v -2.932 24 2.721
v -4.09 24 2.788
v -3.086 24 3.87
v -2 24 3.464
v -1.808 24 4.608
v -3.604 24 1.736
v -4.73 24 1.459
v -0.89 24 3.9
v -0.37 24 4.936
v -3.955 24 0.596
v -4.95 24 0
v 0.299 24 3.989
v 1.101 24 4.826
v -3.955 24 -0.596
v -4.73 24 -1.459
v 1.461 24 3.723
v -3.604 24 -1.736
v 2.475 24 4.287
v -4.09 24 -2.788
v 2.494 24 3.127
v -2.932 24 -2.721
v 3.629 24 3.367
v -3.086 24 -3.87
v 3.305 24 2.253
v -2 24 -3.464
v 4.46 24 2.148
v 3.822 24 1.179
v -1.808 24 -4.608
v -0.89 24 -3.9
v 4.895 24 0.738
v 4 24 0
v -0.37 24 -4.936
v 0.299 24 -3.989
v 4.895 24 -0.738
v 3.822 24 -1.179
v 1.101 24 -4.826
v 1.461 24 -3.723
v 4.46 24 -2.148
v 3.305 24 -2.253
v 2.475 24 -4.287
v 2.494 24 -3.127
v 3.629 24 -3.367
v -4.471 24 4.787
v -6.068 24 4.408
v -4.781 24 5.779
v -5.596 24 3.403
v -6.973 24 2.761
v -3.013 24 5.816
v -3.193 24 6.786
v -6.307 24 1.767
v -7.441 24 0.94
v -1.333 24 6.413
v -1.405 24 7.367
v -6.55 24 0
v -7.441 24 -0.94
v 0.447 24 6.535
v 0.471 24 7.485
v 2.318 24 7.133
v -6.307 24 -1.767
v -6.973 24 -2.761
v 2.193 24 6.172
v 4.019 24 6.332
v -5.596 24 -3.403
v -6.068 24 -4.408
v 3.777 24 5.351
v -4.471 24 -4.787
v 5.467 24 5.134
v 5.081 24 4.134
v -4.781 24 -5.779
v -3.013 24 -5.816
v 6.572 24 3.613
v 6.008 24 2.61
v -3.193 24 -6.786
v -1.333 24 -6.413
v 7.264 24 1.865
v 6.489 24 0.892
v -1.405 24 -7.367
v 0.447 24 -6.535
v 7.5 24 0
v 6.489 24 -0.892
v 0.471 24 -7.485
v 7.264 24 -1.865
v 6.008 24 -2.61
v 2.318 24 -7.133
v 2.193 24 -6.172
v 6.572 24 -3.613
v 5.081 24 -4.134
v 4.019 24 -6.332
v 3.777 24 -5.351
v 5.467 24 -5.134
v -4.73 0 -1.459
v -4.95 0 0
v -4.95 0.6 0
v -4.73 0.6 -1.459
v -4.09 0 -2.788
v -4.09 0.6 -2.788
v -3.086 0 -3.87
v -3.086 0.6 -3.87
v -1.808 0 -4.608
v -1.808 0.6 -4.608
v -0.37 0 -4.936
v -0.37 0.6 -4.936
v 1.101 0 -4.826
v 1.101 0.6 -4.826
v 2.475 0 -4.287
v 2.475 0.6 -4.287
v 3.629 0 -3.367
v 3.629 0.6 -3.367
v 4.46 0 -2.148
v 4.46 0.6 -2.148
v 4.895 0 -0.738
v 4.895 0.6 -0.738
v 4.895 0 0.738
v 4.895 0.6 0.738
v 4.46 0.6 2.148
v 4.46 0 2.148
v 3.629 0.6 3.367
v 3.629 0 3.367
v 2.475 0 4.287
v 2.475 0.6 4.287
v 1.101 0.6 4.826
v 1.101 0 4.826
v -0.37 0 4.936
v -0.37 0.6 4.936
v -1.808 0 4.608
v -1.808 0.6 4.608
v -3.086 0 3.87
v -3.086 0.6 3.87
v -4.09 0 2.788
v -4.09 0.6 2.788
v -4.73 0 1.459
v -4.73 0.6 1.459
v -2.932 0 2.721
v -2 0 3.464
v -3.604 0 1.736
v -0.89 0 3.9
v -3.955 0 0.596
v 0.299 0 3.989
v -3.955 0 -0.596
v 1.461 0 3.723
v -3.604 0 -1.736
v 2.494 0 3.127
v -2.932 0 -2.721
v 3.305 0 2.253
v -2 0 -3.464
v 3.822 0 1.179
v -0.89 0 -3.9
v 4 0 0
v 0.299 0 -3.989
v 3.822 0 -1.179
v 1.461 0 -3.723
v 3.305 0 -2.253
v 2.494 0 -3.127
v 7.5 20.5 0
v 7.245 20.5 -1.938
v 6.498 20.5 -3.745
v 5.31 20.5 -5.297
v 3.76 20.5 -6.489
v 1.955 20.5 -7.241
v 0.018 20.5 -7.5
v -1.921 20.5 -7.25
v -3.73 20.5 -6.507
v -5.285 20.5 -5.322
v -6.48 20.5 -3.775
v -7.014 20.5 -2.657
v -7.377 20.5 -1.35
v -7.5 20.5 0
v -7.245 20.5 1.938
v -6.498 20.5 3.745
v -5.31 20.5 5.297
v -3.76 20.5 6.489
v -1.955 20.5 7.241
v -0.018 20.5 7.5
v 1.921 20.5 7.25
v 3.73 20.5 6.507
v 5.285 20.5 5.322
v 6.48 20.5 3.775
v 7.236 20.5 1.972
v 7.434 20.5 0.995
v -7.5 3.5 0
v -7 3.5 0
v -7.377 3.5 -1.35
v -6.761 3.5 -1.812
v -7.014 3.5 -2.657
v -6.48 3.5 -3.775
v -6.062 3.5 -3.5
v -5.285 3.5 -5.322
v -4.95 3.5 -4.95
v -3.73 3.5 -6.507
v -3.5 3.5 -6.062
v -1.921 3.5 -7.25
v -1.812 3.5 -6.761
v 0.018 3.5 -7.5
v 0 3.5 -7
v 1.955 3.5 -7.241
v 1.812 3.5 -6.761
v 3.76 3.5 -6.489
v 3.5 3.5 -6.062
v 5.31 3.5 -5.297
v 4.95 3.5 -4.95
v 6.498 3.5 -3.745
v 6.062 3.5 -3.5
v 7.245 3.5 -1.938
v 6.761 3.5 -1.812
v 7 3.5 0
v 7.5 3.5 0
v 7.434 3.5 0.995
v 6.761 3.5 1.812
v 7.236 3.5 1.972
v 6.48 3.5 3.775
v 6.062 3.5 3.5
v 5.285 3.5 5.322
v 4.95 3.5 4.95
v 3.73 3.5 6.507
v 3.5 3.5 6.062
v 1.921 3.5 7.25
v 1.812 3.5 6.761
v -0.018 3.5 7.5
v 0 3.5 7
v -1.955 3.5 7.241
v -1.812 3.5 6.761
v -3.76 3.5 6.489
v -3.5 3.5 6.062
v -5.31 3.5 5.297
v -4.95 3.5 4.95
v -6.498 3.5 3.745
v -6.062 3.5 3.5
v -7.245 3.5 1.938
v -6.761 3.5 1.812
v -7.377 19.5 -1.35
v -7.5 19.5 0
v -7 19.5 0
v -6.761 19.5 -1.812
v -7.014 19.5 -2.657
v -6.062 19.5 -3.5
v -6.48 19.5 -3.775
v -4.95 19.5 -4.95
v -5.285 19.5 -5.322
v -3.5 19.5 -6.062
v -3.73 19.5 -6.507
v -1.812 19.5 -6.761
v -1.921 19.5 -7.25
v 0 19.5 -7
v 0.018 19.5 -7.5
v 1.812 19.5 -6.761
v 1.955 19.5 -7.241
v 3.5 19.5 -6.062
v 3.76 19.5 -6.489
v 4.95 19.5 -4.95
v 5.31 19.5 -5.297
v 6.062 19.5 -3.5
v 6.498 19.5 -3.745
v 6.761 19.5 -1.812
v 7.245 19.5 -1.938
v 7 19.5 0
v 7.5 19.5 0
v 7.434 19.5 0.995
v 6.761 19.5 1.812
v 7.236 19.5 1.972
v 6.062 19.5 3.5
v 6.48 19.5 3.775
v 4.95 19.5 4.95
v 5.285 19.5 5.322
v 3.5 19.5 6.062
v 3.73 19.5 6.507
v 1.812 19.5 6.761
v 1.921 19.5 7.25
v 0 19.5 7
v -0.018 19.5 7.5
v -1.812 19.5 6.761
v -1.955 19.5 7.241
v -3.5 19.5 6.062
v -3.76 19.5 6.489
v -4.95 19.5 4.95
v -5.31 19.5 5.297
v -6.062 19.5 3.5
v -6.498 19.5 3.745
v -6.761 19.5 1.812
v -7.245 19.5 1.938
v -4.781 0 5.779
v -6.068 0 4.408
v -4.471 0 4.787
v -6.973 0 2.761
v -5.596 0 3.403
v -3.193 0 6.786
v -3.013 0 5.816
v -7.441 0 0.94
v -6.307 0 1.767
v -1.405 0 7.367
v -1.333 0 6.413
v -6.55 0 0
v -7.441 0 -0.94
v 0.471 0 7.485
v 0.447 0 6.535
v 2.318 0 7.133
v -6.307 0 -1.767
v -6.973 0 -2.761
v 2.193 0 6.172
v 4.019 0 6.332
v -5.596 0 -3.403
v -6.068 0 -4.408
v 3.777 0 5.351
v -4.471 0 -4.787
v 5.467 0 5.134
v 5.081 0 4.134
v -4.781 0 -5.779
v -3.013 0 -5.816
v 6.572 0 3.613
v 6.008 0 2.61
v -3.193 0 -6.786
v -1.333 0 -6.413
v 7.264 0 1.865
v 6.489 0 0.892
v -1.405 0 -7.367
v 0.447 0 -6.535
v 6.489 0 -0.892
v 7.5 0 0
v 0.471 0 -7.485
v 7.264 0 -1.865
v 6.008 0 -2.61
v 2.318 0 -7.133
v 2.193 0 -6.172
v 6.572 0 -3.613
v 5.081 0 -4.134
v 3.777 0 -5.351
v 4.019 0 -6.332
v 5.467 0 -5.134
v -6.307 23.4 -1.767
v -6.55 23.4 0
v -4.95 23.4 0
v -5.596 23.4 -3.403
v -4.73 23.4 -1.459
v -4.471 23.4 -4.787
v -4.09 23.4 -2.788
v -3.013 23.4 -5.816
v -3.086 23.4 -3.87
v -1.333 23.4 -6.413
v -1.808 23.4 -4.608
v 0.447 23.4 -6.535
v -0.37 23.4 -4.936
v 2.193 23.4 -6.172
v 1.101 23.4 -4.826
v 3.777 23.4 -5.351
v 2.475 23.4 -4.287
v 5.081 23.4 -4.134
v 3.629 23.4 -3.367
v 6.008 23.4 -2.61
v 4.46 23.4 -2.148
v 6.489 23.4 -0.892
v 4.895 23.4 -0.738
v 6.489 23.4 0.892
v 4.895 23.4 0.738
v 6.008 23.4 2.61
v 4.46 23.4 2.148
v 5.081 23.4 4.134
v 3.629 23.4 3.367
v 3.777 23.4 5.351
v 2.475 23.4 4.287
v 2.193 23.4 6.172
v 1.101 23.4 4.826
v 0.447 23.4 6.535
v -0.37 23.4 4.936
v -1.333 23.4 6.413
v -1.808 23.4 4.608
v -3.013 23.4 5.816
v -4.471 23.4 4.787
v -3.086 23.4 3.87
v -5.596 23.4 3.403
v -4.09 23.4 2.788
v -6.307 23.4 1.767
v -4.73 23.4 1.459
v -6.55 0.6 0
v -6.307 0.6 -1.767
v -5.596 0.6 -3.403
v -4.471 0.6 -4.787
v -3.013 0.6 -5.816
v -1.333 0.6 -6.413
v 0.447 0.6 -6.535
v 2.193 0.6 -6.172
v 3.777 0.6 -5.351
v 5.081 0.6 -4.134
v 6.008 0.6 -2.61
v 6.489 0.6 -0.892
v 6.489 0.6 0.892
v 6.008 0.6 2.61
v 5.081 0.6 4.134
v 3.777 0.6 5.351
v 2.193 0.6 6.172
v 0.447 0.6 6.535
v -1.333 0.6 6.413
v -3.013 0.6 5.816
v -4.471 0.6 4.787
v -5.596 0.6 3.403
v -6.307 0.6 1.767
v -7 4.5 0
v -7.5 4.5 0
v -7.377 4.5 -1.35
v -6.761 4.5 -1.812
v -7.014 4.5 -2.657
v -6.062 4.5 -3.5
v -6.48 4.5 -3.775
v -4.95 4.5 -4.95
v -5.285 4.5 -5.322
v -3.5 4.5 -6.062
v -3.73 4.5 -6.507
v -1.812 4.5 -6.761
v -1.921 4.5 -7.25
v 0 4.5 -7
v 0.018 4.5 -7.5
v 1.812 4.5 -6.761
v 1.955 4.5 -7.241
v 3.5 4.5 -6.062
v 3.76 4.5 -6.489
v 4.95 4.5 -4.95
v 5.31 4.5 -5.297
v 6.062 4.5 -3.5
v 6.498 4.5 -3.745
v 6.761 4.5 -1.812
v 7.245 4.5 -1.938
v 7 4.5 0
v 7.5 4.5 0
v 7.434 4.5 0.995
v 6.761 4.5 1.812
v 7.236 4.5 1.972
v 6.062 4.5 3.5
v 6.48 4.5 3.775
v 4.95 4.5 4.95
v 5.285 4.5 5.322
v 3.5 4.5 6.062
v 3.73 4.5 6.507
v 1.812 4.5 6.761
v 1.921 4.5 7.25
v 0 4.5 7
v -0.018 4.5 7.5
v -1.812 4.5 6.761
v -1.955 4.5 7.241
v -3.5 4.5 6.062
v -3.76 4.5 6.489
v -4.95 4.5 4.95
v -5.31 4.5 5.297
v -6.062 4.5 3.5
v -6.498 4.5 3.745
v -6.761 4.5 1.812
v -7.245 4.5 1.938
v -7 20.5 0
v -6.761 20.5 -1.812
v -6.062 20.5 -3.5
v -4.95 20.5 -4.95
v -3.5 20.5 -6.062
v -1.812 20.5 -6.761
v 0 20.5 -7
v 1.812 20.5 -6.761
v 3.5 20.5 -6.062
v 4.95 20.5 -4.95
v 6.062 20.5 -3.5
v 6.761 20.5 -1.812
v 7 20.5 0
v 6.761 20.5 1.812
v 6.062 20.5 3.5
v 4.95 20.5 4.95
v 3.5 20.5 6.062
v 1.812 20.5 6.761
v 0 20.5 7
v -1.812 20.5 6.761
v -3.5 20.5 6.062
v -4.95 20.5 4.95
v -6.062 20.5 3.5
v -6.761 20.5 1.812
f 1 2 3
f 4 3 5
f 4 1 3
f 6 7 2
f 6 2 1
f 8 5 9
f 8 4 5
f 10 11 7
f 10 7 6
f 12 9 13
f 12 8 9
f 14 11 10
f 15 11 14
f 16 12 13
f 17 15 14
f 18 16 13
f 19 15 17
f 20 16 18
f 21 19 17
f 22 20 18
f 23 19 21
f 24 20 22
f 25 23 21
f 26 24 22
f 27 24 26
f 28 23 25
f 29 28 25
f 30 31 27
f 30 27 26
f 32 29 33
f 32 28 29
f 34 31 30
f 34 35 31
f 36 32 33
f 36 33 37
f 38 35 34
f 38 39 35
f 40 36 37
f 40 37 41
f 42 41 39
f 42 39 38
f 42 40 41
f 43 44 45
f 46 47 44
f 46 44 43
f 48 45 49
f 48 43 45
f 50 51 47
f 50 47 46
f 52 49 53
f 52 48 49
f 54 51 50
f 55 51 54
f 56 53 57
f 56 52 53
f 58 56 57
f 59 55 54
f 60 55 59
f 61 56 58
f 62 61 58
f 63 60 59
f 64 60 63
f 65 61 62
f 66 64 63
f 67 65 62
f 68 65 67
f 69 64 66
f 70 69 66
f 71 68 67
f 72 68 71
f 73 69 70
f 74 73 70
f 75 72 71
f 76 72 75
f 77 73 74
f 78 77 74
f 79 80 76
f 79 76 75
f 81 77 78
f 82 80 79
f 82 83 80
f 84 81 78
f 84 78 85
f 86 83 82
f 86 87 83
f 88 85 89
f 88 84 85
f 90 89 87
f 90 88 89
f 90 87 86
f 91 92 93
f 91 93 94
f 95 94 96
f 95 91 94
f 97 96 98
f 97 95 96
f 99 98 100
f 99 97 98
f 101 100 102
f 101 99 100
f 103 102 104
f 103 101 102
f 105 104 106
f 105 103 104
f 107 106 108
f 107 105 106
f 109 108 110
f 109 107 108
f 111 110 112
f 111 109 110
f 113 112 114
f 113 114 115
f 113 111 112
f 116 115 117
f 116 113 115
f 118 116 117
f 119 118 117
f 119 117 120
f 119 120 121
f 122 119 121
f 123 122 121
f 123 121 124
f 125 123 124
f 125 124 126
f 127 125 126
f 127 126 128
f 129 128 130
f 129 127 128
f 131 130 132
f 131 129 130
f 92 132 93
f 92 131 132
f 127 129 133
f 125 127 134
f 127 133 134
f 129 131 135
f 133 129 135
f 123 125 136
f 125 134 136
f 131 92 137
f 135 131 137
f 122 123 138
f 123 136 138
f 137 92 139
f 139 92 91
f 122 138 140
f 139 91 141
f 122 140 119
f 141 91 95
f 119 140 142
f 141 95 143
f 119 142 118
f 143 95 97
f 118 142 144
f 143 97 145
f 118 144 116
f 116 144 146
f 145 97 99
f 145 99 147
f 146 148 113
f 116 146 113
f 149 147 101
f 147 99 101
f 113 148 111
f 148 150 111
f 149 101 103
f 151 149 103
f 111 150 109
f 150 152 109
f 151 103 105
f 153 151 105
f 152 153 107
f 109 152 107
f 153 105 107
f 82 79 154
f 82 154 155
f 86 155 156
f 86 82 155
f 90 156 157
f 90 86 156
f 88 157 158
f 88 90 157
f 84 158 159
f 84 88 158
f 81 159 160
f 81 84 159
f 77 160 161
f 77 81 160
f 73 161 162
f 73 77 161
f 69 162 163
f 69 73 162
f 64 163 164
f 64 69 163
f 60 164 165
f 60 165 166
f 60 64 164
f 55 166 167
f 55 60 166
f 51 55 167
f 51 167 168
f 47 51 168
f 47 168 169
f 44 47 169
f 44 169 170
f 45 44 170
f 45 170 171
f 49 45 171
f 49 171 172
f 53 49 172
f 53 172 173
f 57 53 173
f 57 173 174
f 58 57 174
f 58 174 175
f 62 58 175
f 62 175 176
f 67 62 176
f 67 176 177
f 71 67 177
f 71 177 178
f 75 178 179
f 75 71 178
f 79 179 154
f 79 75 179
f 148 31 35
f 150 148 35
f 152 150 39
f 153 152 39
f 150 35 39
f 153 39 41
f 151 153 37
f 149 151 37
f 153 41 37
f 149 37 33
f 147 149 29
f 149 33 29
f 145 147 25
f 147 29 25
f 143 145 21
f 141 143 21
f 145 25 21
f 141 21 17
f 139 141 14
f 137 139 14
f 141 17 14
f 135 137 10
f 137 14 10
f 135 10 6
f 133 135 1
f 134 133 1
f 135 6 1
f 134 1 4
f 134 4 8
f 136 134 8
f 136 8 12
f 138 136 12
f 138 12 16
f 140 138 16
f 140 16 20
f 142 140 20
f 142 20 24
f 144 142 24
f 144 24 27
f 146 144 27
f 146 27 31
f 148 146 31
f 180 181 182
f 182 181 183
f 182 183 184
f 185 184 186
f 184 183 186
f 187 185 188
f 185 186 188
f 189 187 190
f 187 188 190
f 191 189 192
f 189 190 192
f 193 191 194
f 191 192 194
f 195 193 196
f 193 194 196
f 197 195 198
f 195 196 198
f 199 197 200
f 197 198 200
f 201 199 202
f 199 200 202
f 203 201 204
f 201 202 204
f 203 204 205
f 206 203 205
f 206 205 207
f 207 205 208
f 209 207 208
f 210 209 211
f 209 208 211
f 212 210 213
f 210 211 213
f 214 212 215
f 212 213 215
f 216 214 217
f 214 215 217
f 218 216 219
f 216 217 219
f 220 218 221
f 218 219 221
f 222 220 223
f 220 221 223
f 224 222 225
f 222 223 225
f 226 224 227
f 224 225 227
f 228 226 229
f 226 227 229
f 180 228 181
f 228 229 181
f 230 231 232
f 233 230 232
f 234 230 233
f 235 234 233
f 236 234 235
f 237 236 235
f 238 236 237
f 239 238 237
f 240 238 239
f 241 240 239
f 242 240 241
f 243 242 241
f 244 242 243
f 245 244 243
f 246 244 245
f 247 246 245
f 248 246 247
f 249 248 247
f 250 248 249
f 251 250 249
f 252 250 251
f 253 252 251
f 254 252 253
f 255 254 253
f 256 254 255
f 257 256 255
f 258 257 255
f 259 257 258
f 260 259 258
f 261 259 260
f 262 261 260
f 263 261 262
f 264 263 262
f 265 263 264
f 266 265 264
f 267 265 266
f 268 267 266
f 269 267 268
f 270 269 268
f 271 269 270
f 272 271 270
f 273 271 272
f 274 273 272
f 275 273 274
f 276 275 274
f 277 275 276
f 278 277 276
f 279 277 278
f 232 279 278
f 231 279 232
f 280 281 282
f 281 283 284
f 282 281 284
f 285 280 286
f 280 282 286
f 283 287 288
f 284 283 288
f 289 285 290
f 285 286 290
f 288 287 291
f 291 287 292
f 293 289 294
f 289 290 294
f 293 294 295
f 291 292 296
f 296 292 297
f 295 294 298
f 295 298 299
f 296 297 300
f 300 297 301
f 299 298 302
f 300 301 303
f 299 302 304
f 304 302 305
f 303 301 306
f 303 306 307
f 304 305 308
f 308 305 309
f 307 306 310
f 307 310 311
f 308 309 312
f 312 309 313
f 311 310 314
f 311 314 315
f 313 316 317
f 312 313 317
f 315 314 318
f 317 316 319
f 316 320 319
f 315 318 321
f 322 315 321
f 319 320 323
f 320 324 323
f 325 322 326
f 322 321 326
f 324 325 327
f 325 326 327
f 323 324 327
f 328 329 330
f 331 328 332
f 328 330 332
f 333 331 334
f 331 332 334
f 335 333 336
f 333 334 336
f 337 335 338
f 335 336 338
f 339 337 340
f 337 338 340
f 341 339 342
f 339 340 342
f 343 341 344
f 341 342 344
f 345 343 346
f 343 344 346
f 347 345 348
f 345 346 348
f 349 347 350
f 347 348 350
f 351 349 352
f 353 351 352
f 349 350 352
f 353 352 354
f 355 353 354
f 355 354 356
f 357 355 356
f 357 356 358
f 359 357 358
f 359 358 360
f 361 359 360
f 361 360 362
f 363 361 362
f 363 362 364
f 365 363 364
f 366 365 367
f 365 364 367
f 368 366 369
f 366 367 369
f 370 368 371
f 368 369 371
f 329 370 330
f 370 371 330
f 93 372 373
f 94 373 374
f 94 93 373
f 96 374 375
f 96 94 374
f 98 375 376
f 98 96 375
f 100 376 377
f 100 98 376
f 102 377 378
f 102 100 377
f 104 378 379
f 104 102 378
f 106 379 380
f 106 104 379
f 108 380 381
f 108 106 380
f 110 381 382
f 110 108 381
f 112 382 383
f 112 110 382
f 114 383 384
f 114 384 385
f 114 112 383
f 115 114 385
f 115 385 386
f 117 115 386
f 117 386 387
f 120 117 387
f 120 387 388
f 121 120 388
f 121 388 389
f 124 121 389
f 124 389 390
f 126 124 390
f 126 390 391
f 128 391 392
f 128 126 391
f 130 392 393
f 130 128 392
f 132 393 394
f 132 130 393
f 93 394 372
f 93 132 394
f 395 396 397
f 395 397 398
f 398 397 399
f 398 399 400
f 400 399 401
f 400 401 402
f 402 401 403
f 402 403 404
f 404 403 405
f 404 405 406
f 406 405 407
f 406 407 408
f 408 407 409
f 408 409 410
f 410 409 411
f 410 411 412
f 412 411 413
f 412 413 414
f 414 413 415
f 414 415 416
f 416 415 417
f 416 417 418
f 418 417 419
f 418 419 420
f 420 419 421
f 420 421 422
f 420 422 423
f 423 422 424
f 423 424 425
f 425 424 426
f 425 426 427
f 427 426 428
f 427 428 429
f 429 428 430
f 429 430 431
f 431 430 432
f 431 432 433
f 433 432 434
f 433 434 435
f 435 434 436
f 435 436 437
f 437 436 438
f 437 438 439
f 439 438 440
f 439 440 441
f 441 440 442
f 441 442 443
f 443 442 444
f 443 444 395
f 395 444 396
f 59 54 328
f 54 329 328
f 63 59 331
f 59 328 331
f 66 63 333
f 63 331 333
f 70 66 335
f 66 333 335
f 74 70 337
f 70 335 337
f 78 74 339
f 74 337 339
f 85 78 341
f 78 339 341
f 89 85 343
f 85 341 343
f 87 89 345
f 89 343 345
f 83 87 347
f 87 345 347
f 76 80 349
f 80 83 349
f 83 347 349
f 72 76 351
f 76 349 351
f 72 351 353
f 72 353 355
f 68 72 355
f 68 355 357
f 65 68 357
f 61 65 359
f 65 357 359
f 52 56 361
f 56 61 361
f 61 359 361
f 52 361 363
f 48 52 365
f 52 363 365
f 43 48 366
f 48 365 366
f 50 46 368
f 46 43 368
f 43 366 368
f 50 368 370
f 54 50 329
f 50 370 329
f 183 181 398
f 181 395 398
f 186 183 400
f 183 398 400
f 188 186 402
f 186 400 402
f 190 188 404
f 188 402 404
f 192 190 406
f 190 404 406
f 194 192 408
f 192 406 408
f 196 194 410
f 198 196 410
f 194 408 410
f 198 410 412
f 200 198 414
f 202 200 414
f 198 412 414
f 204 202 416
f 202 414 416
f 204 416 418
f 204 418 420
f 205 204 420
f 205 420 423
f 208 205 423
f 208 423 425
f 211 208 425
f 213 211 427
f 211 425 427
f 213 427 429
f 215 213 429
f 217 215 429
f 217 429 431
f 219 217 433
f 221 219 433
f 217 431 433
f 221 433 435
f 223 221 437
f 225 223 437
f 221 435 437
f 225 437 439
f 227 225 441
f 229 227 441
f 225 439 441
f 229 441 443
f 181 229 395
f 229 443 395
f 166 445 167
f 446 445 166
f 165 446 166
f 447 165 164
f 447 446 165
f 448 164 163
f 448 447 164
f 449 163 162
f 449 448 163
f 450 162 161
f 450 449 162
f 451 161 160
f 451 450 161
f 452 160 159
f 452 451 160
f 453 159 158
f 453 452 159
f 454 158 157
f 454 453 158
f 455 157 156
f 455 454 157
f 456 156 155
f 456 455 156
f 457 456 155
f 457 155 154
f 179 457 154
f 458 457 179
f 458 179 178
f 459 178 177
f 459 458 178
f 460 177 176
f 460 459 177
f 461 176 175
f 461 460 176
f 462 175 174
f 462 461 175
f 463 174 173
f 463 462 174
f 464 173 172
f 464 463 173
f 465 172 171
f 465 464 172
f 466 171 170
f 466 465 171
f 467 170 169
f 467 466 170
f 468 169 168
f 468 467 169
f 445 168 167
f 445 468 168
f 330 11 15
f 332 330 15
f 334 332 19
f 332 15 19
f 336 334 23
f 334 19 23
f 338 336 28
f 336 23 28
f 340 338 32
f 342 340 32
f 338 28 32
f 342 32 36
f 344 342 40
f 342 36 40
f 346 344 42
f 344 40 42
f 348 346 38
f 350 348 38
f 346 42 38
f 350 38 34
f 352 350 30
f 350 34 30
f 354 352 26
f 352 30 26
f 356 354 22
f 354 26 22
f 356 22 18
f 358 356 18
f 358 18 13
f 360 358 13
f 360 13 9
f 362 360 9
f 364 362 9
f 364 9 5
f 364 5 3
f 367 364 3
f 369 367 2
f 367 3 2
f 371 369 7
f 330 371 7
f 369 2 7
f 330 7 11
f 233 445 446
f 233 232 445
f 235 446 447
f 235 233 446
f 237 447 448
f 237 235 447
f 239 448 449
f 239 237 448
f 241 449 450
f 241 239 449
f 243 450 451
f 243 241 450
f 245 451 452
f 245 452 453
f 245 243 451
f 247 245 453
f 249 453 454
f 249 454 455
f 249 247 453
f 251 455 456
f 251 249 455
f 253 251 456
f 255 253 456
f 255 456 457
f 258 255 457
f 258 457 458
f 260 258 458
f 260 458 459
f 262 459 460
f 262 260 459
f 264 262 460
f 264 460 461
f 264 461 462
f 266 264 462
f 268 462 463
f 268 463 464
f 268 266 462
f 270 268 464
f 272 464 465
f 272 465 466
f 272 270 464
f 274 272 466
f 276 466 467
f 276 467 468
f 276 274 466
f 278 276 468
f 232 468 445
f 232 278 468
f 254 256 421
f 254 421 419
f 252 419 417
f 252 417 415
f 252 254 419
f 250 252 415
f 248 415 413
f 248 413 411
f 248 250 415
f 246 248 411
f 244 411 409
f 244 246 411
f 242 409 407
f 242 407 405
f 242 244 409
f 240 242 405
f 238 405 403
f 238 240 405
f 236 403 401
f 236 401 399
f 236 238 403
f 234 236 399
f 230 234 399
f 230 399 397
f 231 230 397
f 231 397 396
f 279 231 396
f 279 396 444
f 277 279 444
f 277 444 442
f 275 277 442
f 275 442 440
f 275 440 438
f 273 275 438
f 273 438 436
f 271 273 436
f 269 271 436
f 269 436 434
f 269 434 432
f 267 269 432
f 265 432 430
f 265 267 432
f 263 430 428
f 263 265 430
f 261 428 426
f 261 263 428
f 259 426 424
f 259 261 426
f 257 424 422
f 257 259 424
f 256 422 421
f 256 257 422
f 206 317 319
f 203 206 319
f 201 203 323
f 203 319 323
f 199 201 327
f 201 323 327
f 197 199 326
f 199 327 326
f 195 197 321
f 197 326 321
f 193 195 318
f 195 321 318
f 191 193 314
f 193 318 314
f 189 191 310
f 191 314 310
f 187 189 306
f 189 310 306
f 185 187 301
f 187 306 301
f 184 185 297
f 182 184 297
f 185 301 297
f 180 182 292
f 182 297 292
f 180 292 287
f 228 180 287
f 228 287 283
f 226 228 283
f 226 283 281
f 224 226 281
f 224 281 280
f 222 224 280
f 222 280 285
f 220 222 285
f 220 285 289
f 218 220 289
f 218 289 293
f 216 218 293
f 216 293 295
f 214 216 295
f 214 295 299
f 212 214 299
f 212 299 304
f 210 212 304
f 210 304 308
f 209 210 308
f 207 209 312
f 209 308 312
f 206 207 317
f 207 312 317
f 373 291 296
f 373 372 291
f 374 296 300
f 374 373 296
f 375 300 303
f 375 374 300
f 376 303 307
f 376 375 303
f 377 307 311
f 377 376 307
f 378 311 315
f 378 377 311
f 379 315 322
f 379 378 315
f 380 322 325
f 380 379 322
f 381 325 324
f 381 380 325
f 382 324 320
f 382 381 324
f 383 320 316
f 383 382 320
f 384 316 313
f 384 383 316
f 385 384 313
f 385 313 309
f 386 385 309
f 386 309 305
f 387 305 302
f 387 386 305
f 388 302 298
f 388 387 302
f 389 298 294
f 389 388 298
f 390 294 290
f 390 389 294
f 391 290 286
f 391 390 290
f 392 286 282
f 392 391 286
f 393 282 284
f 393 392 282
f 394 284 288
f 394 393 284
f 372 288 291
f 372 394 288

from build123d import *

# Parameters (mm, degrees)
ESQUISSE1_R        = 7.5
ESQUISSE1_R_2      = 4
BOSS_EXTRU_1_DEPTH = 12
ESQUISSE4_W        = 1
ESQUISSE4_H        = 1
ESQUISSE6_W        = 1.6
ESQUISSE6_H        = 1.2


with BuildPart() as part:
    # Esquisse1 → Boss.-Extru.1 (new body)
    with BuildSketch(Plane(origin=(0, 0, 0), x_dir=(1, 0, 0), z_dir=(0, 1, 0))):
        Circle(ESQUISSE1_R)
        Circle(ESQUISSE1_R_2, mode=Mode.SUBTRACT)
    extrude(amount=BOSS_EXTRU_1_DEPTH)

    # Enlèvement de matière-Balayage1: sweep along a path in Esquisse2
    with BuildLine(Plane(origin=(0, 4, 0), x_dir=(-1, 0, 0), z_dir=(0, -1, 0))) as enl_vement_de_mati_re_balayage1_path:
        CenterArc((0, 0), 7.5, 0, 360)
    # Esquisse4 → Enlèvement de matière-Balayage1 (sweep, cut)
    with BuildSketch(Plane.XY):
        with Locations((-7.5, 4)):
            Rectangle(ESQUISSE4_W, ESQUISSE4_H)
    sweep(path=enl_vement_de_mati_re_balayage1_path.line, mode=Mode.SUBTRACT)

    # Enlèvement de matière-Balayage2: sweep along a path in Esquisse5
    with BuildLine(Plane(origin=(0, 0, 0), x_dir=(-1, 0, 0), z_dir=(0, -1, 0))) as enl_vement_de_mati_re_balayage2_path:
        CenterArc((0, 0), 5.75, 0, 360)
    # Esquisse6 → Enlèvement de matière-Balayage2 (sweep, cut)
    with BuildSketch(Plane(origin=(0, 0, 0), x_dir=(0, 0, -1), z_dir=(1, 0, 0))):
        with Locations((5.75, 0)):
            Rectangle(ESQUISSE6_W, ESQUISSE6_H)
    sweep(path=enl_vement_de_mati_re_balayage2_path.line, mode=Mode.SUBTRACT)

    # Symétrie1: part across plane


with BuildPart() as part_1:
    add(part.part)
    add(part.part.mirror(Plane.ZX.offset(12)))


solid = part_1.part
